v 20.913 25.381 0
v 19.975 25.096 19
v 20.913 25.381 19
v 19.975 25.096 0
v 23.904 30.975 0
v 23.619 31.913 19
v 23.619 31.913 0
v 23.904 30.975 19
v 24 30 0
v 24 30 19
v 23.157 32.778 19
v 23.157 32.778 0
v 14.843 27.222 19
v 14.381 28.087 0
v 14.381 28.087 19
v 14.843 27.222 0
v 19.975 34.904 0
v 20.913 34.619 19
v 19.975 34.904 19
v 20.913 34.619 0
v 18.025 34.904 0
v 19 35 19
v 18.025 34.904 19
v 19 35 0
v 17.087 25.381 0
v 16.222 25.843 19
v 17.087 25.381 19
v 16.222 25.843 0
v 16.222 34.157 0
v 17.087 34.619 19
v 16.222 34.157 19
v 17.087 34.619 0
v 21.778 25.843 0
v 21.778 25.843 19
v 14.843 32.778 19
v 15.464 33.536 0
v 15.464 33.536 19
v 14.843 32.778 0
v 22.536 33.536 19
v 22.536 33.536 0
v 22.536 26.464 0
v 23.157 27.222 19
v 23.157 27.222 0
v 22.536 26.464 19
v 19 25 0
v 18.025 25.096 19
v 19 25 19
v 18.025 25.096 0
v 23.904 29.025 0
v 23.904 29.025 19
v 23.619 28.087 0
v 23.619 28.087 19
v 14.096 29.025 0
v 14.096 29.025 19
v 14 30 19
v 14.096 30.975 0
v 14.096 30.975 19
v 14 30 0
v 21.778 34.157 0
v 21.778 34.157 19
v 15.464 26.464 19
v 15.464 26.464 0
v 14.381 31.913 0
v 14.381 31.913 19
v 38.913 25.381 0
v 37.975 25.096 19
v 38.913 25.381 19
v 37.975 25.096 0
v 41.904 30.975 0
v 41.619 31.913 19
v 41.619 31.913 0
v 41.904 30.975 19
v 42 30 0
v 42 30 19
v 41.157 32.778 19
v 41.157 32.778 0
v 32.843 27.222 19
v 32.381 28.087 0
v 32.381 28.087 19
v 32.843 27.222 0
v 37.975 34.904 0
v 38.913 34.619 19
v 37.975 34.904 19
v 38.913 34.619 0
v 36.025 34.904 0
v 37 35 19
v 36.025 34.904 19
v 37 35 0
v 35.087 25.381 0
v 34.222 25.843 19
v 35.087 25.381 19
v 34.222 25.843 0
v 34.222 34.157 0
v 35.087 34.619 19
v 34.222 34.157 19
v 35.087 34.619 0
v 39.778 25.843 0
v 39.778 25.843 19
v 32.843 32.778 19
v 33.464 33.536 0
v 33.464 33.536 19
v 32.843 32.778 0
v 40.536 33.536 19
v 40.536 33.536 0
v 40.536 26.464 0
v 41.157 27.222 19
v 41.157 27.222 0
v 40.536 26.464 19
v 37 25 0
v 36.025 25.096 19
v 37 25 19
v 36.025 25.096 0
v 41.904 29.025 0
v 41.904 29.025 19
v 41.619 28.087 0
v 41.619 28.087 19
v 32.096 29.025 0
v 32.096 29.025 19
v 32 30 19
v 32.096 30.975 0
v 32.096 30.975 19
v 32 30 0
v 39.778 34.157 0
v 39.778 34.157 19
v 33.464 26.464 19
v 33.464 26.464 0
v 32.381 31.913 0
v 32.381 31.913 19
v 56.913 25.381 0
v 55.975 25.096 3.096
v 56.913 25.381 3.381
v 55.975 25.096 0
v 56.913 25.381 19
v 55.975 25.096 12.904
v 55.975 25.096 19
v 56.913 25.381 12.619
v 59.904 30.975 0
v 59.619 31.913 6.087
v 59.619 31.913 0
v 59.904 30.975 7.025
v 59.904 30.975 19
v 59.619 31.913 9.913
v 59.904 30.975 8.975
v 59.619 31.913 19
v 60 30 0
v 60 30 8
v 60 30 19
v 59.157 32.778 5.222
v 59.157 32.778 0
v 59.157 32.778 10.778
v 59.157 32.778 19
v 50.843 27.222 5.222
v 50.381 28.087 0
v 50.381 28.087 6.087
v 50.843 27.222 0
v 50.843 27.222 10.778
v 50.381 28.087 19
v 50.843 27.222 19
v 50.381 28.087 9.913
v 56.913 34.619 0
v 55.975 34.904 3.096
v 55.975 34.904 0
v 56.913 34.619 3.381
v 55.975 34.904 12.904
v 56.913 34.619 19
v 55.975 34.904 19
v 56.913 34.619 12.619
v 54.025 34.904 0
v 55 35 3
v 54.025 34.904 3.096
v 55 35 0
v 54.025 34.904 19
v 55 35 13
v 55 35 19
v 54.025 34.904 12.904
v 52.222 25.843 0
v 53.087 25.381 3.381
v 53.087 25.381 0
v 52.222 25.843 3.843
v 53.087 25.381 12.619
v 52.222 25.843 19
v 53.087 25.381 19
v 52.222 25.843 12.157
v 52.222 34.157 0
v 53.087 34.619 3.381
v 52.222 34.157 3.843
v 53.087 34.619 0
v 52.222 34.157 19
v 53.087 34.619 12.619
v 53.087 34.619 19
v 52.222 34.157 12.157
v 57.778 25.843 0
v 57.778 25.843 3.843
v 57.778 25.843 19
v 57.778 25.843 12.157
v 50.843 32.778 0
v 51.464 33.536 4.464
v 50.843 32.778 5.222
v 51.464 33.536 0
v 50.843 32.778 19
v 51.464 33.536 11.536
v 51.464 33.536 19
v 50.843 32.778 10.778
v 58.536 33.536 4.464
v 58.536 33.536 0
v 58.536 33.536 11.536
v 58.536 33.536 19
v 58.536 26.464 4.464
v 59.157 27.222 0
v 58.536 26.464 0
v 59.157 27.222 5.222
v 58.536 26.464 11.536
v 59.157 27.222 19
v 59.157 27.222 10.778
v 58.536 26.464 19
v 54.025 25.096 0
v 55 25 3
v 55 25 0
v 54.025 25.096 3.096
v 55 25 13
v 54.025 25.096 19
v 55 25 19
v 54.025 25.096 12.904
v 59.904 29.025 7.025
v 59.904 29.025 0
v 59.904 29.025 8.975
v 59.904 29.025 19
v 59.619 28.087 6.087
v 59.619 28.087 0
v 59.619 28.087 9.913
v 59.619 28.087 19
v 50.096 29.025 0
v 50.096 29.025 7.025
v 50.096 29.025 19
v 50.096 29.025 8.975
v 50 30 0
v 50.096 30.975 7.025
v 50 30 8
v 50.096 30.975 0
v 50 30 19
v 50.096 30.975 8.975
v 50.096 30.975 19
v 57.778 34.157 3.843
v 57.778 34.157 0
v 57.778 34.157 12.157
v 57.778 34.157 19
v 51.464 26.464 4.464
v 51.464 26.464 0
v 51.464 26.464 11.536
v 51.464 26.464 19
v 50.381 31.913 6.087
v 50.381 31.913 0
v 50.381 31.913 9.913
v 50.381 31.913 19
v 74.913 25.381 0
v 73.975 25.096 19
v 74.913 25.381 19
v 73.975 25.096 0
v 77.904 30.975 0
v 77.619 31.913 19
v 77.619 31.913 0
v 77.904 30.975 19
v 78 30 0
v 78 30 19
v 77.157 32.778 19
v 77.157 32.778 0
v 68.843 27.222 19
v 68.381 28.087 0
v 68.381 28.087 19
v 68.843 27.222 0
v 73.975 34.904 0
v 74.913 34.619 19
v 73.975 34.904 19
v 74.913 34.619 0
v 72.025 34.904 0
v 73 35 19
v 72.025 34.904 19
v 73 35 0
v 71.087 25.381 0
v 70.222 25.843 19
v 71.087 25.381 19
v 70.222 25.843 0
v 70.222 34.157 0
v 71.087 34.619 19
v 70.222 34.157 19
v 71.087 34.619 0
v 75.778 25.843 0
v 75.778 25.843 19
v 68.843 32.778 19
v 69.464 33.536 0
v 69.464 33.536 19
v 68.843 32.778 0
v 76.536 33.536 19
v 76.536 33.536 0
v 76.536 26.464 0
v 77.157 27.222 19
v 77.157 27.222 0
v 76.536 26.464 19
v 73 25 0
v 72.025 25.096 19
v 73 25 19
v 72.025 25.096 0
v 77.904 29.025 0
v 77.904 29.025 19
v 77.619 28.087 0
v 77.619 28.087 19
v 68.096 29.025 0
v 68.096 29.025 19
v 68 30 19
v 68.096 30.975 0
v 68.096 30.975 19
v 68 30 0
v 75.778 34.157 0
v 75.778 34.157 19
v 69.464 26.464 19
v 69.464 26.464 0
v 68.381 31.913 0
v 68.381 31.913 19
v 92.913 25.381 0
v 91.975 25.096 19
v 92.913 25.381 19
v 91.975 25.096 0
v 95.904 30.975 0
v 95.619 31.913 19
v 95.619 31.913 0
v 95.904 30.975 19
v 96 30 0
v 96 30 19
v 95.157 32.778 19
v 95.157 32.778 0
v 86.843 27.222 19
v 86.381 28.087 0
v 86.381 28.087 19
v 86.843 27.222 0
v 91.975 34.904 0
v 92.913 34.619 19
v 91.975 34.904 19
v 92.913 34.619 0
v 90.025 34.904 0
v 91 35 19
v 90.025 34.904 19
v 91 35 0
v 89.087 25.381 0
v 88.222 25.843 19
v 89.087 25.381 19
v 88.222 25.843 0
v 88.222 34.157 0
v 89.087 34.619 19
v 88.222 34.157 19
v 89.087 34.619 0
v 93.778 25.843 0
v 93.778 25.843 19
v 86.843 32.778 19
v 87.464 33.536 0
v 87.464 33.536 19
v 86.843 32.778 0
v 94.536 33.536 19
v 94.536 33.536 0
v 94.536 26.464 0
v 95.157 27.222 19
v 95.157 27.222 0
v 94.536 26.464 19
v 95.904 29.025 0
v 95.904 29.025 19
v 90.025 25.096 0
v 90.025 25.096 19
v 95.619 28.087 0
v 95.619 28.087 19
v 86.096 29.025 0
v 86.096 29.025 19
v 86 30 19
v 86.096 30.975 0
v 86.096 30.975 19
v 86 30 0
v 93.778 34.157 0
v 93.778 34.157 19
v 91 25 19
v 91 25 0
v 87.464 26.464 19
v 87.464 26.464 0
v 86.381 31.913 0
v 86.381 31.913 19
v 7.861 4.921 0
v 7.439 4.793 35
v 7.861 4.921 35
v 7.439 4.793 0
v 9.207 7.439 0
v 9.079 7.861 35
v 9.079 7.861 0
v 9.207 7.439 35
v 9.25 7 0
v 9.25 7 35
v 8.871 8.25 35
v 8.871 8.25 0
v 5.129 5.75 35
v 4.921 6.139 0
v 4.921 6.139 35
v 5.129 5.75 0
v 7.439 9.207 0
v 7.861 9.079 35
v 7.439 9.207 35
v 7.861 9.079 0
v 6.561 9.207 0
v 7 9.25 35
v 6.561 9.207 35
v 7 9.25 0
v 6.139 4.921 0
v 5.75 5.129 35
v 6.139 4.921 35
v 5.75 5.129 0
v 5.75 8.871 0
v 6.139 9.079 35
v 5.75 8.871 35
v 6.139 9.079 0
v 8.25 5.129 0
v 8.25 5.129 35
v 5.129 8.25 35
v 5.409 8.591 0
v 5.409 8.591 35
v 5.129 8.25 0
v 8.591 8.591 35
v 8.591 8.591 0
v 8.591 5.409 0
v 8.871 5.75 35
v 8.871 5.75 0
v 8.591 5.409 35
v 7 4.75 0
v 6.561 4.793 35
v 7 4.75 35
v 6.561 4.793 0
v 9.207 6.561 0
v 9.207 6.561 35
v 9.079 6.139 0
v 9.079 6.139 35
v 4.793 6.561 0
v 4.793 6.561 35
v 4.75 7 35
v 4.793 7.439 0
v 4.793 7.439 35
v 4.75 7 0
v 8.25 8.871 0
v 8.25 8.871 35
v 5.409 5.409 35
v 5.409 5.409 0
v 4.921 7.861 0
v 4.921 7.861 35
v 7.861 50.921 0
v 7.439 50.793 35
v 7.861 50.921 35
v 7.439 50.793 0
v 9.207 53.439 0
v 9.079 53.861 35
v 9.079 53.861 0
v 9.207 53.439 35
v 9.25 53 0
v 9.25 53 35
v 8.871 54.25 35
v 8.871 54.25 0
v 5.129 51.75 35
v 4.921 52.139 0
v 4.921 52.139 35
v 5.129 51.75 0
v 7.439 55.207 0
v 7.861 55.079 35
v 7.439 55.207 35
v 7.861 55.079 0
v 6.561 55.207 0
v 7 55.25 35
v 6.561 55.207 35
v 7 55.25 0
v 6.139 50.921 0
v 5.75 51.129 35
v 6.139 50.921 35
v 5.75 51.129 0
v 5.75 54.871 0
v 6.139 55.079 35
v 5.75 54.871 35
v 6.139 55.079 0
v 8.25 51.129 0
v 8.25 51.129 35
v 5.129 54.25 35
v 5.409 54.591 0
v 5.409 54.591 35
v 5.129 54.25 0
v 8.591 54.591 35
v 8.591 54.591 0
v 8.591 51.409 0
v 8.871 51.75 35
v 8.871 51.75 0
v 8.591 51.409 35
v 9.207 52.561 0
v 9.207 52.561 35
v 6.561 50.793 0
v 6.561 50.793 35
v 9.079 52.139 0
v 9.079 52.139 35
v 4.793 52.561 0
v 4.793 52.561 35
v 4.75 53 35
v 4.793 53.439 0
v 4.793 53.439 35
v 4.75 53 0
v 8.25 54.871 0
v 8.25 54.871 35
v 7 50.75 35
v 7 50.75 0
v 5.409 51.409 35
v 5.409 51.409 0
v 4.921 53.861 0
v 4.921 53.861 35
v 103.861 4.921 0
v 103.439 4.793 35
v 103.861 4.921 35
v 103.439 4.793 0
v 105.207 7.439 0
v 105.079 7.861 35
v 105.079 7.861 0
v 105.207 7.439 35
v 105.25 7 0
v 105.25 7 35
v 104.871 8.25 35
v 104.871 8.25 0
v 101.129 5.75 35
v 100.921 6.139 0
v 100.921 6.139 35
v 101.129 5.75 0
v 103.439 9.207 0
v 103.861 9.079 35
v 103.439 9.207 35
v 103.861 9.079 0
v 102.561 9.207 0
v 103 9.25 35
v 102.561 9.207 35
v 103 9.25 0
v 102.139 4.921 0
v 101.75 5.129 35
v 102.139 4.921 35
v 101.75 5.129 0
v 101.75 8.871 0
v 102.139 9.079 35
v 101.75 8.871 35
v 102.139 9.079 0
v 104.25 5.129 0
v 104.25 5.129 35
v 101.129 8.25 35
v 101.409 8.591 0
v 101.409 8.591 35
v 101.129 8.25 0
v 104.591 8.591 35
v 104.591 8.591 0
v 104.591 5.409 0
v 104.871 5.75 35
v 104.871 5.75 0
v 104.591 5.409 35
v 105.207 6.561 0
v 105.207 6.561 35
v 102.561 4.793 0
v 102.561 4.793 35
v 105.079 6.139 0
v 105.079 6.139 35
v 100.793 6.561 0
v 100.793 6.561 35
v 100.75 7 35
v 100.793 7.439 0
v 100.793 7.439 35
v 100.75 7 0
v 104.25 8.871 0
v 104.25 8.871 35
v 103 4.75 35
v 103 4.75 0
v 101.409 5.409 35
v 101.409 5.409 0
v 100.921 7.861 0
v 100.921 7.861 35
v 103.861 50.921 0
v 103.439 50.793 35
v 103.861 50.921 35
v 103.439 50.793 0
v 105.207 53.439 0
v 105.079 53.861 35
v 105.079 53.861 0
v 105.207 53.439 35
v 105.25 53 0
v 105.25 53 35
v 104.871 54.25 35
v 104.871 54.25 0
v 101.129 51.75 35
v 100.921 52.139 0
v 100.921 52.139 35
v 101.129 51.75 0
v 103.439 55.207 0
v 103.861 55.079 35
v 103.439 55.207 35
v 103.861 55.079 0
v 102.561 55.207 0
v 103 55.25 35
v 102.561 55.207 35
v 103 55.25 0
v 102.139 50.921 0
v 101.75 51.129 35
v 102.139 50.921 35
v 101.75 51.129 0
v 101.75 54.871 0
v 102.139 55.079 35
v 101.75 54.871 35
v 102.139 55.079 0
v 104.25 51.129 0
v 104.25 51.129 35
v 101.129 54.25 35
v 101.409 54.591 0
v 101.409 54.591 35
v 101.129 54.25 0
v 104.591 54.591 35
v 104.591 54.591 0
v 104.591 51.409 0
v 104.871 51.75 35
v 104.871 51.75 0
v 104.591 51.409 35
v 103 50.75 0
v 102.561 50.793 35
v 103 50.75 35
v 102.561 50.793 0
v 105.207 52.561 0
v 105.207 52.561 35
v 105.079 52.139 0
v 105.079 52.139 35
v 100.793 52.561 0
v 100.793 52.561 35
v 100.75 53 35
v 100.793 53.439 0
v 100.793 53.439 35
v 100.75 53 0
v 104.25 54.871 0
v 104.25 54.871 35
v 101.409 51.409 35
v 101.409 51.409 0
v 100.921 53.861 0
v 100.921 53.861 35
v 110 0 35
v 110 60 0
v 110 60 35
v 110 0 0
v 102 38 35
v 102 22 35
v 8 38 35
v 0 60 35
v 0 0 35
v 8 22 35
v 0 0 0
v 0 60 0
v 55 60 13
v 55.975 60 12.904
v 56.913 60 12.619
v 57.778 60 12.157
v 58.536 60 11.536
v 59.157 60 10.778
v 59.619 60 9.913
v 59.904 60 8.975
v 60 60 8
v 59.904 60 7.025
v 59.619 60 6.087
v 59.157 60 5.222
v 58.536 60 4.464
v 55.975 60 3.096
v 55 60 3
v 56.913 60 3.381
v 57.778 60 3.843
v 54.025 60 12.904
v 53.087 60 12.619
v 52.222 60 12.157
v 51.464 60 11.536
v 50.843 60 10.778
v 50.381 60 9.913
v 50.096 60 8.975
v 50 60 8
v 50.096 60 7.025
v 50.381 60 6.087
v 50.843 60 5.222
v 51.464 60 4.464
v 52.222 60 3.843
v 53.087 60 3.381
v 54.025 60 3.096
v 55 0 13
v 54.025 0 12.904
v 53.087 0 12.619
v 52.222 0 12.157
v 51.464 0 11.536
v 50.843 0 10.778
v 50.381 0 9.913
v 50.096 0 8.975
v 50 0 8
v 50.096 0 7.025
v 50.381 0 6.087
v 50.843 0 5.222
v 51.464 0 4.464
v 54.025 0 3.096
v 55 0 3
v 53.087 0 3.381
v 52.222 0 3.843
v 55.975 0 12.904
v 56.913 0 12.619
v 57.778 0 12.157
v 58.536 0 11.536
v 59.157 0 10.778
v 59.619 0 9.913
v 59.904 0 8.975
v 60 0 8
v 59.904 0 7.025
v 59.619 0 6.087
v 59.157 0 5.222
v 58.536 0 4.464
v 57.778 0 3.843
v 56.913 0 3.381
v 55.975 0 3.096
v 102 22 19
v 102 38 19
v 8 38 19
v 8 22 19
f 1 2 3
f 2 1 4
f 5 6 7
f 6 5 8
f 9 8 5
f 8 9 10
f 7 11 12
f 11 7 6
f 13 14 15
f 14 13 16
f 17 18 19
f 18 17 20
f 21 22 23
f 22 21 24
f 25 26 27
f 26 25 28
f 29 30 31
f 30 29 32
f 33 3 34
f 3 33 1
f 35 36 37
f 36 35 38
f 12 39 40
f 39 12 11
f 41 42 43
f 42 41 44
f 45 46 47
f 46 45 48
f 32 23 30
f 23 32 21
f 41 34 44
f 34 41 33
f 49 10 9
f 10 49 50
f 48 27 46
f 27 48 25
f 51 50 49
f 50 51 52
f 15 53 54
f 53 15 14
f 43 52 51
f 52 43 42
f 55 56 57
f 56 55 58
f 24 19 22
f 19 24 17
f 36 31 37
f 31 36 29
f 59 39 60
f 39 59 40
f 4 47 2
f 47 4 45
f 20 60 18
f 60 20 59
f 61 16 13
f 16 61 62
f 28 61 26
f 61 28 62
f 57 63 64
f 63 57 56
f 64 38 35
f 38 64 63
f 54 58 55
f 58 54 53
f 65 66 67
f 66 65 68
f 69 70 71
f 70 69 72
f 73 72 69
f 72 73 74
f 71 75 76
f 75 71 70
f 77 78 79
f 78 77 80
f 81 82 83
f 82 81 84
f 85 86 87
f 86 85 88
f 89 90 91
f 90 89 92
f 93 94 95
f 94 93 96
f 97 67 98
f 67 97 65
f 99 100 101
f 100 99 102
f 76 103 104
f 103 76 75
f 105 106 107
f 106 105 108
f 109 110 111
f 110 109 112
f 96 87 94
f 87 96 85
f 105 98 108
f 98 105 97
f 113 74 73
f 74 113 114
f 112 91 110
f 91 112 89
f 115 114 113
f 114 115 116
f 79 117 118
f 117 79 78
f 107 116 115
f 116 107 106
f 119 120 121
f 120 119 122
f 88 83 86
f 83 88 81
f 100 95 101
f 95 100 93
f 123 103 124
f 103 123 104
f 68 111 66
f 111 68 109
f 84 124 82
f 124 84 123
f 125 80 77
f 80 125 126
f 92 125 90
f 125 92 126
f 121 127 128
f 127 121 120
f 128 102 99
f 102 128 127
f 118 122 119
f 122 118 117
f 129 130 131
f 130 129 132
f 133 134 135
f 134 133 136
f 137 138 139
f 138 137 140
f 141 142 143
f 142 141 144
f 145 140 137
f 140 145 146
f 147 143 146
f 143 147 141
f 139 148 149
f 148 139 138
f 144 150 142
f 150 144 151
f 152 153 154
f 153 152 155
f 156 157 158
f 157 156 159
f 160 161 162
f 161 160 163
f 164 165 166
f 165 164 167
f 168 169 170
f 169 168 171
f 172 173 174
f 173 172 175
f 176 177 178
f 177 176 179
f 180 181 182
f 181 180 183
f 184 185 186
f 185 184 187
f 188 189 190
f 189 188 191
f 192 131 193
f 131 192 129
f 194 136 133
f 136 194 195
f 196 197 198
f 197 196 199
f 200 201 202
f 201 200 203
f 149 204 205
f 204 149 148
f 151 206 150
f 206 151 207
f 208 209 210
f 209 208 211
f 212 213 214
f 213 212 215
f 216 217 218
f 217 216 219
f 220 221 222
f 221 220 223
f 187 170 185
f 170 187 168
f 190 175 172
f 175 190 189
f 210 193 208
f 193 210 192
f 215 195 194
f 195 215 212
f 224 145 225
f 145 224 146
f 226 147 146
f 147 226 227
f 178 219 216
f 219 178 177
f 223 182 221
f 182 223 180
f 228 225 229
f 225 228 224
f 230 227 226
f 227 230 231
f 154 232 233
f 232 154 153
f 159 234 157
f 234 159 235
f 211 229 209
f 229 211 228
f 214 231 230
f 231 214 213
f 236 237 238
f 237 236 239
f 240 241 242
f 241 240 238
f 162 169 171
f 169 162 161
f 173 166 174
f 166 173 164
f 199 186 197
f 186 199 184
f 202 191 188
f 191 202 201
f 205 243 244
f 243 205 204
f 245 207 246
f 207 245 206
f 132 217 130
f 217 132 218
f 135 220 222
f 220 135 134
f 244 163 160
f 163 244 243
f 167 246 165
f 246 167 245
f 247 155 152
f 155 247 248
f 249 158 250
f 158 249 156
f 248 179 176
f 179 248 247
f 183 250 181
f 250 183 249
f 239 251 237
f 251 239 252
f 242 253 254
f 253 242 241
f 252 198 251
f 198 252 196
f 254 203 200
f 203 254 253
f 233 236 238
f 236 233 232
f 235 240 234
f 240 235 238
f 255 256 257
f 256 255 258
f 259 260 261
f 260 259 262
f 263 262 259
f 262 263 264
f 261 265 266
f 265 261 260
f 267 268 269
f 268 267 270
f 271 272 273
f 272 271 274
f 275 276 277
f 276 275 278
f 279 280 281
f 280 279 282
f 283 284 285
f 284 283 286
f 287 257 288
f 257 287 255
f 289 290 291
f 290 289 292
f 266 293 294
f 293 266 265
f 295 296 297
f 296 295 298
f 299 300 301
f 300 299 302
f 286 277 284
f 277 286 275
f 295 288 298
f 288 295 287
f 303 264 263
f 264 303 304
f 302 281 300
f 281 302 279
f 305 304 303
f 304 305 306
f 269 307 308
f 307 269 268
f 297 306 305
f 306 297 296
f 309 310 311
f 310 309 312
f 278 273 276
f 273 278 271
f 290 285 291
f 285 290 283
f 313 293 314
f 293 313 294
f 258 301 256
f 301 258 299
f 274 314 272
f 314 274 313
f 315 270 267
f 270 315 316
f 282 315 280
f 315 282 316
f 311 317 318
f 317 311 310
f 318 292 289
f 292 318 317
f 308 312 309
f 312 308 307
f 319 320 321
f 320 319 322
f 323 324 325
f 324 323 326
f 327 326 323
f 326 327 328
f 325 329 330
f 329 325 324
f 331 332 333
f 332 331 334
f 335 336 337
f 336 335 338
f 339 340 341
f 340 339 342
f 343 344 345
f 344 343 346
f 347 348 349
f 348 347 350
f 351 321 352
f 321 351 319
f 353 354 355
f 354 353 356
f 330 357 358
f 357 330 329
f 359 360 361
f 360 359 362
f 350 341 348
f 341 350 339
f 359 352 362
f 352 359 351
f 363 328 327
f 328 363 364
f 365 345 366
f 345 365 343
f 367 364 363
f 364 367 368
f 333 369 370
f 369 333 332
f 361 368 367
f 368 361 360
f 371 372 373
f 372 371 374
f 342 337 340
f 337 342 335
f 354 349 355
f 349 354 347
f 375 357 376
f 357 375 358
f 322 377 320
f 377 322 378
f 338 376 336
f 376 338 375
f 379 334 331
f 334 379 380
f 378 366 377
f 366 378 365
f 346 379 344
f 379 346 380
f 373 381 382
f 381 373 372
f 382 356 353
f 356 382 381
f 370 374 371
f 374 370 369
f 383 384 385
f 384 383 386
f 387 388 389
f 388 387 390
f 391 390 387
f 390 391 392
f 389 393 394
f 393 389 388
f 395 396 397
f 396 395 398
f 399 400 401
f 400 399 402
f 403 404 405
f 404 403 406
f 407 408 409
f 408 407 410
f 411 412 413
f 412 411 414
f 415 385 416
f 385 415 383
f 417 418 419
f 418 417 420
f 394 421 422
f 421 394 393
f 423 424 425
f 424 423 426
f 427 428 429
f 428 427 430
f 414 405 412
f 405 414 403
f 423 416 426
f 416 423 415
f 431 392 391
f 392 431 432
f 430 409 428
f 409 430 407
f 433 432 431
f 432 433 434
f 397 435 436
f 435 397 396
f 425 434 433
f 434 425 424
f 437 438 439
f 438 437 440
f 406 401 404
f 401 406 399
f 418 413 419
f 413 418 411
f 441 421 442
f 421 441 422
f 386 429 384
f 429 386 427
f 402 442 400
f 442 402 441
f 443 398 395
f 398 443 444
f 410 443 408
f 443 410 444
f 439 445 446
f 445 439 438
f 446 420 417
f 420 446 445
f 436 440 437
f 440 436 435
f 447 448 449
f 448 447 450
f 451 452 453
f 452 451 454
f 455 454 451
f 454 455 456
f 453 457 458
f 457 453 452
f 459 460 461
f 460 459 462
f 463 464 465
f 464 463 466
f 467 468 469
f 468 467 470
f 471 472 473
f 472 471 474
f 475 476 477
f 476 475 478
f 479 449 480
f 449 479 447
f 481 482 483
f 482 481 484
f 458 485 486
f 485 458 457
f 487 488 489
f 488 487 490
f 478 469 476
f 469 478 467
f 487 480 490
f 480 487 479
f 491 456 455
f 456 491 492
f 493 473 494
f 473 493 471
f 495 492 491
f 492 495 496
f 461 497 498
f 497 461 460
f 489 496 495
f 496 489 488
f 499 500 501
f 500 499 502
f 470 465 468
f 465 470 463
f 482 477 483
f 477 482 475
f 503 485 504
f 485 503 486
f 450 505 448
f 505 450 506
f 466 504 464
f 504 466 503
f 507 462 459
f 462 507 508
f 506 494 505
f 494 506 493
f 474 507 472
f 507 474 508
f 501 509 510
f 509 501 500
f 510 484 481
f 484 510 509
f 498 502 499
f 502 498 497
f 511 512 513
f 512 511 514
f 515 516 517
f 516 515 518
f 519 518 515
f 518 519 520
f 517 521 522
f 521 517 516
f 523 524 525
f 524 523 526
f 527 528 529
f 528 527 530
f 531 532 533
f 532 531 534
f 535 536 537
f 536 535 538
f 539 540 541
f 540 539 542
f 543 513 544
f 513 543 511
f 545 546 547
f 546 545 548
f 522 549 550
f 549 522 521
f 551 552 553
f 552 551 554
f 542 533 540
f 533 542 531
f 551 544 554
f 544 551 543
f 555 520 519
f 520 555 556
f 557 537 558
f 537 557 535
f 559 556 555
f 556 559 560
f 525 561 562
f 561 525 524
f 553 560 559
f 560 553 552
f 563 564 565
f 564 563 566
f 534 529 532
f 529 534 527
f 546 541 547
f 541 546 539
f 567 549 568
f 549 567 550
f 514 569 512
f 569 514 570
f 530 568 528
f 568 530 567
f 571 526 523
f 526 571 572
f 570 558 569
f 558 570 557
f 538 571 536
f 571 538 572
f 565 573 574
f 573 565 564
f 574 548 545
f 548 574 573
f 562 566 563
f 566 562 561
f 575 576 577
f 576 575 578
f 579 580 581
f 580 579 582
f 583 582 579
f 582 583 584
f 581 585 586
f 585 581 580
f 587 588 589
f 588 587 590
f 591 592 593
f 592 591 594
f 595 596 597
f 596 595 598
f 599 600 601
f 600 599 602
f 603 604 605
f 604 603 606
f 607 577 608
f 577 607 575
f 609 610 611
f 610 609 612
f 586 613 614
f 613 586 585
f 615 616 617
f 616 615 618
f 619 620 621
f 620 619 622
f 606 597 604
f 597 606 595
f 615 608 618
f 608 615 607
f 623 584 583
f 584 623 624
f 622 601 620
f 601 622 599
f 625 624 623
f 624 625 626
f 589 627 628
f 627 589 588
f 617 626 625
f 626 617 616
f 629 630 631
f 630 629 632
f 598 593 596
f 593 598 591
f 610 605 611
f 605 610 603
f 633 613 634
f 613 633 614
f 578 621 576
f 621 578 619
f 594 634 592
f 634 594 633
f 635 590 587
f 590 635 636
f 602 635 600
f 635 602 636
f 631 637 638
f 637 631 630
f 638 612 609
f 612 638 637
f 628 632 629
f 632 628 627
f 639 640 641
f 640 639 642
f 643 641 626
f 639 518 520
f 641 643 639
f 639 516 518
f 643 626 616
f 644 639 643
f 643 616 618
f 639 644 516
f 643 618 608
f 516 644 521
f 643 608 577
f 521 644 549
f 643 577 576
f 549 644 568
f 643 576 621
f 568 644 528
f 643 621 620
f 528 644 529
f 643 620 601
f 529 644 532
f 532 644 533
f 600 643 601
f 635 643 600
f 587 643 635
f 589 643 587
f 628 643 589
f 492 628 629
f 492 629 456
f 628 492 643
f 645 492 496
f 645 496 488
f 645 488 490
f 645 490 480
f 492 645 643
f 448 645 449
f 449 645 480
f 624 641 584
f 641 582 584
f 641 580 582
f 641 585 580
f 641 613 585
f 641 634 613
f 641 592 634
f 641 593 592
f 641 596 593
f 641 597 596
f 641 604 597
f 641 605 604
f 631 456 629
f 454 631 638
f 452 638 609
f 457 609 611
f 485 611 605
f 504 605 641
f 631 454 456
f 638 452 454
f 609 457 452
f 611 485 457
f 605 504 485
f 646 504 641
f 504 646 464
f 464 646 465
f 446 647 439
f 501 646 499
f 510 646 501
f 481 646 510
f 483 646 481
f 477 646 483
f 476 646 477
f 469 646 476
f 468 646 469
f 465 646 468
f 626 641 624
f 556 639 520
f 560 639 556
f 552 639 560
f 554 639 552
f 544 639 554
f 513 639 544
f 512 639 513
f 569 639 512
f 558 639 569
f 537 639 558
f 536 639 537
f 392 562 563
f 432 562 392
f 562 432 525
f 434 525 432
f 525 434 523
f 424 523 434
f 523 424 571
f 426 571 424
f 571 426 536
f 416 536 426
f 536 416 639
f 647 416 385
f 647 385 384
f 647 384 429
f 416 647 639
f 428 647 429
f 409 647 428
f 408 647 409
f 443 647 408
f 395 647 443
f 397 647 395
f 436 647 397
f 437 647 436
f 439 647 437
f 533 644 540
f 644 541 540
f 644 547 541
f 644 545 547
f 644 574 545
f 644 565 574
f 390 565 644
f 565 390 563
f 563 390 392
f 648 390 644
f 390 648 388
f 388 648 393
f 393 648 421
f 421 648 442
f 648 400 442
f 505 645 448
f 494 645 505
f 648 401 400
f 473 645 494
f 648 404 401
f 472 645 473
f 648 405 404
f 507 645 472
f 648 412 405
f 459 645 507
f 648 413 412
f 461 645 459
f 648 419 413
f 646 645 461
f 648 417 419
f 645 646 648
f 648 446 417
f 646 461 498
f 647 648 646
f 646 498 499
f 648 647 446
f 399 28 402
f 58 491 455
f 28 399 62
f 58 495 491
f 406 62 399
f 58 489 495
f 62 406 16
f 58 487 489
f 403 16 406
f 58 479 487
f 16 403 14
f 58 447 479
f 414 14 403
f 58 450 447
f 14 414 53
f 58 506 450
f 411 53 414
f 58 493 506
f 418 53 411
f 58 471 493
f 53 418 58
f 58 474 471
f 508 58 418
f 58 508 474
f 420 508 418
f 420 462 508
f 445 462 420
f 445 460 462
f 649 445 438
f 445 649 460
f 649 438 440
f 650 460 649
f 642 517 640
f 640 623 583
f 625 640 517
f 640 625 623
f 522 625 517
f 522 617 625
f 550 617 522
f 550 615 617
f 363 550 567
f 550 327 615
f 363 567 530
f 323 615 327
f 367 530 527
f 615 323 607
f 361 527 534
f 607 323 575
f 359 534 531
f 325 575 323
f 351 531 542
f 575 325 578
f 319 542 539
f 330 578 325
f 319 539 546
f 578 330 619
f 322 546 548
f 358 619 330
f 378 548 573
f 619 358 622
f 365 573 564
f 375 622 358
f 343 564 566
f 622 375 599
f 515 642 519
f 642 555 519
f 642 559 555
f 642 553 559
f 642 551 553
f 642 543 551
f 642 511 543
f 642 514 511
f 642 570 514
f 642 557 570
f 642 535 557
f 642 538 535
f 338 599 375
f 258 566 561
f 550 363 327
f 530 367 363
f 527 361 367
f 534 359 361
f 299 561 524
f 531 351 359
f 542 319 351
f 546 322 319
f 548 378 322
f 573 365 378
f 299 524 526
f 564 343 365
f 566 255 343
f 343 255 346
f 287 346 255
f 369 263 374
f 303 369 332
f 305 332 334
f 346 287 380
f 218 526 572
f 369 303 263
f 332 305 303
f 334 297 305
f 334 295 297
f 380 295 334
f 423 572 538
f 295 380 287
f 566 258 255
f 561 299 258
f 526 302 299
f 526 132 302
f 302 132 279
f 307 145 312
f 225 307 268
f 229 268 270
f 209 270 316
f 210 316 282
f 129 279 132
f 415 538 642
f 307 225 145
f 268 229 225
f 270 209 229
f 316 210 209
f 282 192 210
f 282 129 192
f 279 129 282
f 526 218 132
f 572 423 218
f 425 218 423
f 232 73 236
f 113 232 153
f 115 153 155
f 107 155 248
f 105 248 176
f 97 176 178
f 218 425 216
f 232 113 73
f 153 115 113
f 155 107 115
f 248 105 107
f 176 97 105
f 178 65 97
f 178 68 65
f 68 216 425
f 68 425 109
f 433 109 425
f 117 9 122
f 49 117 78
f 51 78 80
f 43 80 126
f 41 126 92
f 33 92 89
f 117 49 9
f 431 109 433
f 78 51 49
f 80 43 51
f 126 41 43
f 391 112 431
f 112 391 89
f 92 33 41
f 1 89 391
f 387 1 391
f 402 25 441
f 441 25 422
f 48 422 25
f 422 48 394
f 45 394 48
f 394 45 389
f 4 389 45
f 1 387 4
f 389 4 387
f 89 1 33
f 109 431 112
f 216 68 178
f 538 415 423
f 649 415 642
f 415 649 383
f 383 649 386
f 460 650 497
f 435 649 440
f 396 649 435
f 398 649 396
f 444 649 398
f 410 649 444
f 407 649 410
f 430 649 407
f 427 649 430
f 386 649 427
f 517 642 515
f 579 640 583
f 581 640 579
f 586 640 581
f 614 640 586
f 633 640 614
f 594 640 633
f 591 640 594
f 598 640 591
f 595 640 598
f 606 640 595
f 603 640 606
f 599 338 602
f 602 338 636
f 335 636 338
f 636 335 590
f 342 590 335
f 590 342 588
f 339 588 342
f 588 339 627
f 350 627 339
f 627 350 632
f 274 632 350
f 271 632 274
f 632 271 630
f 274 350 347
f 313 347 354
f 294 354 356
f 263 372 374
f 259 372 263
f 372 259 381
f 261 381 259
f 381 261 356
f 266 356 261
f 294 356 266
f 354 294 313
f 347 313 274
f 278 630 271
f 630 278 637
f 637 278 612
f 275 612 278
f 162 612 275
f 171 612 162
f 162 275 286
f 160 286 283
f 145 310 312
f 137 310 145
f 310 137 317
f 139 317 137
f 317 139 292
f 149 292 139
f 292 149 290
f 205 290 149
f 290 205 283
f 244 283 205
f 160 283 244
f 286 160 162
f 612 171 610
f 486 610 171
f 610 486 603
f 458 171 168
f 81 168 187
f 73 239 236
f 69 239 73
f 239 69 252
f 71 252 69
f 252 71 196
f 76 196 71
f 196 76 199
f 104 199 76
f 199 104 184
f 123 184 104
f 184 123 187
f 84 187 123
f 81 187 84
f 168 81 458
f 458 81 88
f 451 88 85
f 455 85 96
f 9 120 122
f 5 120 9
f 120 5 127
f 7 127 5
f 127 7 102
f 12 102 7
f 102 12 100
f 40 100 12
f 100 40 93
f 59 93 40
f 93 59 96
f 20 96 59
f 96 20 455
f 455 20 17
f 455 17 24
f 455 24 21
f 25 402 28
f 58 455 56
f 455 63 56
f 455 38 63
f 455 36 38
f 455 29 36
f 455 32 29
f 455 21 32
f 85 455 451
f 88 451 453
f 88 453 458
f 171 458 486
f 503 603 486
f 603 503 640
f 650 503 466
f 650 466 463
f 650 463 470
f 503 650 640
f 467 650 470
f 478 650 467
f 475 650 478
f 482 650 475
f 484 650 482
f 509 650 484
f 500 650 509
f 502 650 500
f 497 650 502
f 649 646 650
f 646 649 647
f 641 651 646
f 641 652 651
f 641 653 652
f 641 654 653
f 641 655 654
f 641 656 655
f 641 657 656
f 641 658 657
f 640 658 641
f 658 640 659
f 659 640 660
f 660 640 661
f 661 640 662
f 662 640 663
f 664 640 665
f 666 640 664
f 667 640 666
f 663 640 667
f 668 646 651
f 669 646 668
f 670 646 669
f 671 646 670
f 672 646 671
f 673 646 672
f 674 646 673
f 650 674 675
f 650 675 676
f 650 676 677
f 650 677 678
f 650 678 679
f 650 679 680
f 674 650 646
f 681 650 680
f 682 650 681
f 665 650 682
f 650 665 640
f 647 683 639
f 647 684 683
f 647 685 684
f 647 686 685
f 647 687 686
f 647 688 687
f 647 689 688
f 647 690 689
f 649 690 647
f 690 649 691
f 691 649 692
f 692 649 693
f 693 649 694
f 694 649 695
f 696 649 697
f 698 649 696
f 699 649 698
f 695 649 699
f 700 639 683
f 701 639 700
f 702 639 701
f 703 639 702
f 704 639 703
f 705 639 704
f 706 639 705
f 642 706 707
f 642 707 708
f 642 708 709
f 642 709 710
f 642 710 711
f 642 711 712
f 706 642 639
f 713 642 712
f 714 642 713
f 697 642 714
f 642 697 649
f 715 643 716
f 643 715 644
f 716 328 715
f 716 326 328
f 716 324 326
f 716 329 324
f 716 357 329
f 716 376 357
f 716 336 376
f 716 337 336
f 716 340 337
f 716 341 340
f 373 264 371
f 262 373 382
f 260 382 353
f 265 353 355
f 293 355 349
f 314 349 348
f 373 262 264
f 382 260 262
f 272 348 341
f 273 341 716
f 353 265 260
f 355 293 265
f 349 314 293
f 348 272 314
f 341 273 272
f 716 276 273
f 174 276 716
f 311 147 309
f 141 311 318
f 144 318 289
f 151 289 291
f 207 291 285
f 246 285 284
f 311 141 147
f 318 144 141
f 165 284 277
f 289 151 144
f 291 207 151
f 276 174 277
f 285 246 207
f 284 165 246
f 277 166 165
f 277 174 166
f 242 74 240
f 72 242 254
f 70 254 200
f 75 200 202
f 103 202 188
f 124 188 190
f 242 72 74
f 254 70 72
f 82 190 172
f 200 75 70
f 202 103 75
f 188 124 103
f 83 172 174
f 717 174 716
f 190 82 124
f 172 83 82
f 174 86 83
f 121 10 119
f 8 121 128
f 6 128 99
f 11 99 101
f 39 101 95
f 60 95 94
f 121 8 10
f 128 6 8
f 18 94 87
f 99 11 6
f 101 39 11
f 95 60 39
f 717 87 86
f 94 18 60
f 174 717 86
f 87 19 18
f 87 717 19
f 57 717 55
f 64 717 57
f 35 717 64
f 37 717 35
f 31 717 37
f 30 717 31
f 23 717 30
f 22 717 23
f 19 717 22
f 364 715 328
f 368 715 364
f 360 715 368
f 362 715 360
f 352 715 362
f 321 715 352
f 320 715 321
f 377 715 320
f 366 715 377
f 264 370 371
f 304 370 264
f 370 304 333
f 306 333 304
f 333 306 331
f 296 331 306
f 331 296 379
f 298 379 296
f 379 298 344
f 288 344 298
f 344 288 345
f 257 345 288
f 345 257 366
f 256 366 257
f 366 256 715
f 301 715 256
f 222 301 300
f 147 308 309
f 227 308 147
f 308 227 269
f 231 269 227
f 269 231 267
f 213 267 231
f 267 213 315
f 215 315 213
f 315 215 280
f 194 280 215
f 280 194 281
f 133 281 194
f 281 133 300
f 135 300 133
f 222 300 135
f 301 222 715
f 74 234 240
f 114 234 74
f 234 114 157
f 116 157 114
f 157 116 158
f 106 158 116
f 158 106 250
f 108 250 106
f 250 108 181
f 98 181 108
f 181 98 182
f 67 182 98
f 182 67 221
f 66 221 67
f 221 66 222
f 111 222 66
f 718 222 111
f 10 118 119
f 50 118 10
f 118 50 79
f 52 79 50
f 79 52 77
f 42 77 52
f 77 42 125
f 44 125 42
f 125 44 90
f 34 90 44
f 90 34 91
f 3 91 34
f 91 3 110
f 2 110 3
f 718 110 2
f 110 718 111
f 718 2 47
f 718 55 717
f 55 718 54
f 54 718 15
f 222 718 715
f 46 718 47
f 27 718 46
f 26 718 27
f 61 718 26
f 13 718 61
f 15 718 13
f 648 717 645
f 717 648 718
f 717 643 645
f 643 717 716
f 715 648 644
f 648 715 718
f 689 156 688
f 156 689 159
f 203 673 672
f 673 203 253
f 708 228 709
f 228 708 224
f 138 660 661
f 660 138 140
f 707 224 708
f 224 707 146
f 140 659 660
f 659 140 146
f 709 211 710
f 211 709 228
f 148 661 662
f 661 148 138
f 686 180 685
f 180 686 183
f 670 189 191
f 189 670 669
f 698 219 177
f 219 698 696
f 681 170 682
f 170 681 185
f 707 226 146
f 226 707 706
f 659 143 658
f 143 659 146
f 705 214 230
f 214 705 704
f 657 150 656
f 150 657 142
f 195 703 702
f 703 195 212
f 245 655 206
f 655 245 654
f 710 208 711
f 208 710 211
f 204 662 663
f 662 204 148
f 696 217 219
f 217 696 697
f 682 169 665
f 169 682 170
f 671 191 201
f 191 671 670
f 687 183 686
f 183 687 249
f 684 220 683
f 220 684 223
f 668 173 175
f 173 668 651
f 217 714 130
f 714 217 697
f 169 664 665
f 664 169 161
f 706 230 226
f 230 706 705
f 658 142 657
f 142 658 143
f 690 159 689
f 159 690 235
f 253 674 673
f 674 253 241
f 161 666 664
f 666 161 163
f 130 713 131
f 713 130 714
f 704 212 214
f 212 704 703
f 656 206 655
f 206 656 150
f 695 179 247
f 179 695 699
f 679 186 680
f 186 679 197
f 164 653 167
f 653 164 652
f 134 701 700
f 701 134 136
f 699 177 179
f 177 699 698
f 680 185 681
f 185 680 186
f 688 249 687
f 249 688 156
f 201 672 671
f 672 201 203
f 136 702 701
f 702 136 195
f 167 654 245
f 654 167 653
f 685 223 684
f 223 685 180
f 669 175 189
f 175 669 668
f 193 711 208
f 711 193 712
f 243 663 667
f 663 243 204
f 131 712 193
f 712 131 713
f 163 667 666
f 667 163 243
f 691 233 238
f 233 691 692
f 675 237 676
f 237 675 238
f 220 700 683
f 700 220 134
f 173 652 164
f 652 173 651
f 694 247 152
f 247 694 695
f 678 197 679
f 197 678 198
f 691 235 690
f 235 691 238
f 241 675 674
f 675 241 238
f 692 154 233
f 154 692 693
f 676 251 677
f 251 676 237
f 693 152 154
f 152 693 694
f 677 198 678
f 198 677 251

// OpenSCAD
$fn = 32;

// ----------------------------------------------------------------------
// Manifold block: side_outlet manifold
// ----------------------------------------------------------------------

// --- parameters (mm) ---
block_l = 110;            // block length, X
block_w = 60;             // block width, Y
block_h = 35;             // block height, Z
port_d = 10;              // port bore diameter
port_pitch = 18;          // port pitch along X
gallery_d = 16;           // top gallery width, Y
gallery_depth = 16;       // gallery pocket depth
wall_p = 8;               // gallery end wall thickness, X
mnt_d = 4.5;              // mounting hole diameter
mnt_in = 7;               // mounting hole inset from the edges
out_d = 10;               // outlet bore diameter
out_z = 8;                // outlet axis height

n_ports = 5;  // ports in the row
port_x0 = (block_l - (n_ports - 1) * port_pitch) / 2;  // first port X

difference() {
  cube([block_l, block_w, block_h]);
  for (i = [0 : n_ports - 1])
    translate([port_x0 + i * port_pitch, block_w / 2, -1])
      cylinder(h = block_h + 2, d = port_d);
  translate([wall_p, block_w / 2 - gallery_d / 2, block_h - gallery_depth])
    cube([block_l - 2 * wall_p, gallery_d, gallery_depth + 1]);
  for (cx = [mnt_in, block_l - mnt_in])
    for (cy = [mnt_in, block_w - mnt_in])
      translate([cx, cy, -1]) cylinder(h = block_h + 2, d = mnt_d);
  translate([block_l / 2, -1, out_z]) rotate([-90, 0, 0])
    cylinder(h = block_w + 2, d = out_d);
}
